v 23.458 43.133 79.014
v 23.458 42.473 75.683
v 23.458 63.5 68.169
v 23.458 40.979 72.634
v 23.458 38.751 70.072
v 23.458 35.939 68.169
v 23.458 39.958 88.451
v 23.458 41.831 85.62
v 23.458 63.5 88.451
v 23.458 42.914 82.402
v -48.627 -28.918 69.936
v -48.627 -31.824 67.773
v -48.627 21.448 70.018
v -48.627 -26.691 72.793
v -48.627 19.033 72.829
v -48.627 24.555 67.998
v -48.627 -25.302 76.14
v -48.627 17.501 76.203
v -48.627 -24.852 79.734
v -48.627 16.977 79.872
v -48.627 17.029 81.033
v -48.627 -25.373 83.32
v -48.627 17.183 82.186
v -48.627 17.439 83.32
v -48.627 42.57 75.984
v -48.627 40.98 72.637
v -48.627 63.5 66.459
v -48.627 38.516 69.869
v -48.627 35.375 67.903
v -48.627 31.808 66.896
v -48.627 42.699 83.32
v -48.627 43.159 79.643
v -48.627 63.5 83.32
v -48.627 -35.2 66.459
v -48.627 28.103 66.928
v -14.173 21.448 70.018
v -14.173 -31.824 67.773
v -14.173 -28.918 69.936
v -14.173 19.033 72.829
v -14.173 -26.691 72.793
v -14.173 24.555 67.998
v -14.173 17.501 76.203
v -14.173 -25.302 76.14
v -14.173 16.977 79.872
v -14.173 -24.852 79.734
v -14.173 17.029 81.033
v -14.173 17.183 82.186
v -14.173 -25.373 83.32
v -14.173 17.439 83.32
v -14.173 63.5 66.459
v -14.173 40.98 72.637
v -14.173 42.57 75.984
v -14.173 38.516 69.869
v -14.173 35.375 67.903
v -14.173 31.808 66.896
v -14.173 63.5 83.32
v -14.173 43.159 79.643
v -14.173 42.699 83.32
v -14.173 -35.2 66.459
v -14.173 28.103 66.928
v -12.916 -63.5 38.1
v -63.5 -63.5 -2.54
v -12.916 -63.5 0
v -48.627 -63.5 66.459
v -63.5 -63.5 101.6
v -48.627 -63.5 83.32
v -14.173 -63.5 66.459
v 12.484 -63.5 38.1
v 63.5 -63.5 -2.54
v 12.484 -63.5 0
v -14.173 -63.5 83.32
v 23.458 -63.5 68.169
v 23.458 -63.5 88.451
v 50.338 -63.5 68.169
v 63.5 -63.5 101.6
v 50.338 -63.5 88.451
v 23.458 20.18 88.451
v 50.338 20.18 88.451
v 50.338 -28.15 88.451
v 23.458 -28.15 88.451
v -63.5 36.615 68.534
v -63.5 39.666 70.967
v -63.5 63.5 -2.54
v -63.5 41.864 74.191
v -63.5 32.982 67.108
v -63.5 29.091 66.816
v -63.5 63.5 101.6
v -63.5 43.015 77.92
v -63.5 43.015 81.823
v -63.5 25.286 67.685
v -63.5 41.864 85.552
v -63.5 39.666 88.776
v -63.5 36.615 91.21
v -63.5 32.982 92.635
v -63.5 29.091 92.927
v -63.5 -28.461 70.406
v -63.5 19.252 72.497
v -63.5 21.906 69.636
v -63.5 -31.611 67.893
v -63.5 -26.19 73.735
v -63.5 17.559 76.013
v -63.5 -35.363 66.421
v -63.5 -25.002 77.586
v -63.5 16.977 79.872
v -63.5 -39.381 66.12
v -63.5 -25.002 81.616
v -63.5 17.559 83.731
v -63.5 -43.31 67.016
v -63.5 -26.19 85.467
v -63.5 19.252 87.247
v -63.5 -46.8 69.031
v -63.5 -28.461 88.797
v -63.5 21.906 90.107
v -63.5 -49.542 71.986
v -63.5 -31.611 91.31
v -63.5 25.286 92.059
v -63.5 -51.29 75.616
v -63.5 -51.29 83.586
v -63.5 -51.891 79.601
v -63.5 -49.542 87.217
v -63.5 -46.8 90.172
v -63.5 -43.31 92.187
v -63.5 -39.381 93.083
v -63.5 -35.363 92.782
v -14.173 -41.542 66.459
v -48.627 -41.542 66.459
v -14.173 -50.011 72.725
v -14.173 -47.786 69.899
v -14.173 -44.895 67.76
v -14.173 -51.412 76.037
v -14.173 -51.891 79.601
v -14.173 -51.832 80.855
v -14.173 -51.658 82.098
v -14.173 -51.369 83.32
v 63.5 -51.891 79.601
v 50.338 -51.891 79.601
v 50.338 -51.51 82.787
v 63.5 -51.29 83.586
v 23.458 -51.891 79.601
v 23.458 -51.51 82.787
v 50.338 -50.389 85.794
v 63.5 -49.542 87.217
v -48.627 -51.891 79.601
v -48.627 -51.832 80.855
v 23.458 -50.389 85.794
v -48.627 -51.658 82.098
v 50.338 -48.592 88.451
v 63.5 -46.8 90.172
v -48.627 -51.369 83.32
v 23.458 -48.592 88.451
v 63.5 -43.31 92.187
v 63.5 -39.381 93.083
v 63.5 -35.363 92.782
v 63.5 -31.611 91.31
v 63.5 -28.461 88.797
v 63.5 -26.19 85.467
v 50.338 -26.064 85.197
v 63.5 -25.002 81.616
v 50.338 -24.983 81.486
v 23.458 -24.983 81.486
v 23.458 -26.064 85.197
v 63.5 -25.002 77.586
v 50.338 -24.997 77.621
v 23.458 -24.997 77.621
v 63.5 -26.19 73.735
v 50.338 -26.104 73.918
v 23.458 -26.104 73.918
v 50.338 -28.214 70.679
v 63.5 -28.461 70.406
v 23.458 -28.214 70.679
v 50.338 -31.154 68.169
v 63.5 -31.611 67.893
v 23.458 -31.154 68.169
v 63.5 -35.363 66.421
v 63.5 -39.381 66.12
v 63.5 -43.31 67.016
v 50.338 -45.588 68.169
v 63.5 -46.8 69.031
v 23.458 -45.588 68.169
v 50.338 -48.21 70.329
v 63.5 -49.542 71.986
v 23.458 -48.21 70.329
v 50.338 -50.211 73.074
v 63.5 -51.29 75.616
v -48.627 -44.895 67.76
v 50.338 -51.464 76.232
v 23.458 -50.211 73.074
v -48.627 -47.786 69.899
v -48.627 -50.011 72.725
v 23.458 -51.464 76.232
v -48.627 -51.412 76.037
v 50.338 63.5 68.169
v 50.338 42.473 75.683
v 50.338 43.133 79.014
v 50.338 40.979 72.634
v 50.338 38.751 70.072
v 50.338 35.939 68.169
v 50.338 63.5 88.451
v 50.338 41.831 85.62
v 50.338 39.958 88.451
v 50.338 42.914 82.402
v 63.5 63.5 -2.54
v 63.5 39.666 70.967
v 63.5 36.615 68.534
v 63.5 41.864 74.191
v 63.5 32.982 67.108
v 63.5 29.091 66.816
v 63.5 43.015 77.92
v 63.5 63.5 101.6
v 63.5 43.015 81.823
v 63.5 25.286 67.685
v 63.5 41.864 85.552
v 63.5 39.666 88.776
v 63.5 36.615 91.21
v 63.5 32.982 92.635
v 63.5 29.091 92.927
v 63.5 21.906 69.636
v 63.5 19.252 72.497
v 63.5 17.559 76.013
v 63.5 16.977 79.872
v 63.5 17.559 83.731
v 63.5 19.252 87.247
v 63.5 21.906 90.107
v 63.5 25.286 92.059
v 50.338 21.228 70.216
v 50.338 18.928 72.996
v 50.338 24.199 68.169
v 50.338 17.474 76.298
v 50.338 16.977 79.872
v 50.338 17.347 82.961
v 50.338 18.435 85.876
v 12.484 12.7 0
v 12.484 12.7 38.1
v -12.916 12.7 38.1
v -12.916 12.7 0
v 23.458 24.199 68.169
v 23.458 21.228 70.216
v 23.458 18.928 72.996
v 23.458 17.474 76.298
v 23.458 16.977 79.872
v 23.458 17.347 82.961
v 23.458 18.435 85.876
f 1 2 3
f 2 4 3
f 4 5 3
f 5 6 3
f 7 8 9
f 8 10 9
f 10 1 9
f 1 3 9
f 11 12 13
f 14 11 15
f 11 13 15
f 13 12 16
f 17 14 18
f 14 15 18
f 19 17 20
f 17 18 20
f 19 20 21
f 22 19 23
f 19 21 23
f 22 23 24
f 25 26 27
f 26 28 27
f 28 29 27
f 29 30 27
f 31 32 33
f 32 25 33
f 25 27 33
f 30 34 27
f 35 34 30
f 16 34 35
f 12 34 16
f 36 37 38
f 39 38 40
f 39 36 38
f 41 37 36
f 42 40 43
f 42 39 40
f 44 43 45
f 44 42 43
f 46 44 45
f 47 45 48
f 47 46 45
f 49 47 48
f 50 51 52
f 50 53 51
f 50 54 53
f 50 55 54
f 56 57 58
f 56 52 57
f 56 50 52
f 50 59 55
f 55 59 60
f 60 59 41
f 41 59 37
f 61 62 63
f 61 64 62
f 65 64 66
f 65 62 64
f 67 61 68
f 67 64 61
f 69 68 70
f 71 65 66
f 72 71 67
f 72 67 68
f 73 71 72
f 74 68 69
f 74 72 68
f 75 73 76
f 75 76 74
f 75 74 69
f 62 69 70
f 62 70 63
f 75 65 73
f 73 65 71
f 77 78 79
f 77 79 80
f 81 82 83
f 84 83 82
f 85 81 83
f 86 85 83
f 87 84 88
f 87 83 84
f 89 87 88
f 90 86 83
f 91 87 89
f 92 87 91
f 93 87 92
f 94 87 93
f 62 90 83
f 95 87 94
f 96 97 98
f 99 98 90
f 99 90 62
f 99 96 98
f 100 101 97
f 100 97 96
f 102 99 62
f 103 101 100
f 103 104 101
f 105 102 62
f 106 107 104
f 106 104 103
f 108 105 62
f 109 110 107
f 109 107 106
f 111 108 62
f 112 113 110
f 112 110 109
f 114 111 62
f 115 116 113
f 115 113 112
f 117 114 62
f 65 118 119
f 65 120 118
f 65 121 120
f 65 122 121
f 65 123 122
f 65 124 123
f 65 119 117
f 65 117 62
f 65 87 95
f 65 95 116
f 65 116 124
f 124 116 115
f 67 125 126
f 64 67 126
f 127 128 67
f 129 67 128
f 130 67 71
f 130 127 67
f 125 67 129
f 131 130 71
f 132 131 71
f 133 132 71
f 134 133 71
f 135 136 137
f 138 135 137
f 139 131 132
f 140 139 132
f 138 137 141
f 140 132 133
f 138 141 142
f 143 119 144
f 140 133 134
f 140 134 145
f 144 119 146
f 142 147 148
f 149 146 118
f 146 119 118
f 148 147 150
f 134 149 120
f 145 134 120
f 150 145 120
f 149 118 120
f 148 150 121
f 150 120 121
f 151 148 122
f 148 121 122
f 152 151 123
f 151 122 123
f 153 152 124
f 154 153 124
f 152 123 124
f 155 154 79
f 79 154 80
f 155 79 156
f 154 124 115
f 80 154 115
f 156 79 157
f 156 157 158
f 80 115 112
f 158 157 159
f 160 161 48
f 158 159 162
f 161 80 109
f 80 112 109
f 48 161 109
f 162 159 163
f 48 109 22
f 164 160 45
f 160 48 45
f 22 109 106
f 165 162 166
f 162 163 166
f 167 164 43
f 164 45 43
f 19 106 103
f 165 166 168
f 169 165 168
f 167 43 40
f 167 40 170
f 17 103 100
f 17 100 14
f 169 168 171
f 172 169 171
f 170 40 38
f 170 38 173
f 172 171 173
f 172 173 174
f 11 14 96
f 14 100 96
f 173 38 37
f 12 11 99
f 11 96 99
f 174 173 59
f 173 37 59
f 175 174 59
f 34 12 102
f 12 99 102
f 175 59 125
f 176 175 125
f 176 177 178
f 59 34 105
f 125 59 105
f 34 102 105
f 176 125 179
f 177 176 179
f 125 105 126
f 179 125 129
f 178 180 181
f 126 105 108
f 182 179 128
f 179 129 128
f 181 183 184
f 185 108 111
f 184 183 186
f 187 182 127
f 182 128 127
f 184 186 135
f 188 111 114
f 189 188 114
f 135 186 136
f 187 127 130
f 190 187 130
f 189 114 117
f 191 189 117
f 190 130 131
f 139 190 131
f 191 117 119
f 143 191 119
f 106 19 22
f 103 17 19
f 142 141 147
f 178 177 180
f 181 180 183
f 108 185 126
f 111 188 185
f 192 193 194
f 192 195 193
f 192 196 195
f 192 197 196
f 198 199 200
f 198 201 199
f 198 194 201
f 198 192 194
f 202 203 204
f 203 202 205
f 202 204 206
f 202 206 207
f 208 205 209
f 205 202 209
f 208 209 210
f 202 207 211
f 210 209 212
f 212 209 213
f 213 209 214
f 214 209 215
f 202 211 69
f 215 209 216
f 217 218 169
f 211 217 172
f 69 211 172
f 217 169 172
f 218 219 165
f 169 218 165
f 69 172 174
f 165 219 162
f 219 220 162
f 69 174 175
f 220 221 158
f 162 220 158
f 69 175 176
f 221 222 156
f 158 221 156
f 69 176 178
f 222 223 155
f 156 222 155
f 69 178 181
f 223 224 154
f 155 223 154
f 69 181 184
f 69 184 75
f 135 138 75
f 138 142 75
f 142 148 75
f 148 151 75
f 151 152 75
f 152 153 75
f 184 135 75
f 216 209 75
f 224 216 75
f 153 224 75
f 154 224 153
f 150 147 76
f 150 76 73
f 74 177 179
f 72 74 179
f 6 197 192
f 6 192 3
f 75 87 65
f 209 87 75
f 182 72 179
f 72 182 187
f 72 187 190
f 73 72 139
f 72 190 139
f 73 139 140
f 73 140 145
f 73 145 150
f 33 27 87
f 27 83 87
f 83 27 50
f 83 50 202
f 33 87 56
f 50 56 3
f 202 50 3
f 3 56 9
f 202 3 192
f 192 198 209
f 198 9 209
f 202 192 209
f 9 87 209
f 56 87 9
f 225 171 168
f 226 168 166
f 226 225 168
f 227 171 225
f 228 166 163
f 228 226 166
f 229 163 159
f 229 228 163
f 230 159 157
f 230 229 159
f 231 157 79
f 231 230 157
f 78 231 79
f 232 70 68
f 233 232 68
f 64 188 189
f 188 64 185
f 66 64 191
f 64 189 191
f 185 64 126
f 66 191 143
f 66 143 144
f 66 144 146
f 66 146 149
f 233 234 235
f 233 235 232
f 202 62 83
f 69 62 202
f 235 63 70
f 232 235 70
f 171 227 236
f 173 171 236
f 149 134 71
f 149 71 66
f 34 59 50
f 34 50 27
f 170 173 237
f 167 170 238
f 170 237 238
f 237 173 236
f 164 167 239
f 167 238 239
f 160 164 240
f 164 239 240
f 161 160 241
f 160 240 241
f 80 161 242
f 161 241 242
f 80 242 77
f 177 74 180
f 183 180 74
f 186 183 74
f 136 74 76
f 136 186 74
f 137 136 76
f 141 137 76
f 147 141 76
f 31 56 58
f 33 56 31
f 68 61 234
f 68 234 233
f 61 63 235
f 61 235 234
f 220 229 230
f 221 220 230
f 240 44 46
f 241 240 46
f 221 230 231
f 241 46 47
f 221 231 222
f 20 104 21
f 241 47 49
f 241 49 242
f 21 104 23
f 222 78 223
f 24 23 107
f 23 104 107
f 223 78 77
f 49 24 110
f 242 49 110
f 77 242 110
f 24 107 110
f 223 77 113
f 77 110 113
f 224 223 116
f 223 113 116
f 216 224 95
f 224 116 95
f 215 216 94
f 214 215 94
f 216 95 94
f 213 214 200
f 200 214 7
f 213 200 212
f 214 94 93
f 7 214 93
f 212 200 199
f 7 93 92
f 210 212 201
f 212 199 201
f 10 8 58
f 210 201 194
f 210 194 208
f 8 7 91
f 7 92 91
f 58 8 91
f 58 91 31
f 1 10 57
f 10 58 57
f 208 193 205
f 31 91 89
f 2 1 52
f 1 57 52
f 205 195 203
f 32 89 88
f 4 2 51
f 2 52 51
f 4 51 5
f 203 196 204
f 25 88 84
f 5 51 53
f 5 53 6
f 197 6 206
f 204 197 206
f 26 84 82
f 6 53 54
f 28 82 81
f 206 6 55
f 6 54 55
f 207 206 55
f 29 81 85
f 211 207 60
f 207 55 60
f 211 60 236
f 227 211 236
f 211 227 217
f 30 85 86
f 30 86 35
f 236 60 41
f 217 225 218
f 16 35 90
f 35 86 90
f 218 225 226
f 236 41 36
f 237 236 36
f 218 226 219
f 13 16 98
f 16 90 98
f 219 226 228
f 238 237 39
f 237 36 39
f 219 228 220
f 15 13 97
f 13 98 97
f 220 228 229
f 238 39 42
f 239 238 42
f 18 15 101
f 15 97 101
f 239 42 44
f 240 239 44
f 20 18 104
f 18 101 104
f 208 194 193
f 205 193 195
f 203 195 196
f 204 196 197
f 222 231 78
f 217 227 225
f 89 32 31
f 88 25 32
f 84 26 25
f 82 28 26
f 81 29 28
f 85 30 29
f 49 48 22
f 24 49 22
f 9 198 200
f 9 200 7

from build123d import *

# Parameters (mm, degrees)
F0_W     = 127
F0_H     = 127
F1_DEPTH = 101.6
F2_W     = 25.4
F2_H     = 38.1
F3_DEPTH = 76.2
F4_W     = 127
F4_H     = 127
F5_DEPTH = 2.54
F6_W     = 34.454562
F6_H     = 16.860753
F6_W_2   = 26.879448
F6_H_2   = 20.281769
F7_DEPTH = 127.001
F8_R     = 13.091888
F8_R_2   = 13.519639
F9_DEPTH = 127.001


with BuildPart() as f1:
    # F0 (on Top) → F1 (new body)
    with BuildSketch(Plane.XY):
        Rectangle(F0_W, F0_H)
    extrude(amount=F1_DEPTH)

    # F2 (on face) → F3 (cut)
    with BuildSketch(Plane.XZ.offset(63.5)):
        with Locations((-0.216101, 19.05)):
            Rectangle(F2_W, F2_H)
    extrude(amount=-F3_DEPTH, mode=Mode.SUBTRACT)

    # F4 (on face) → F5 (join)
    with BuildSketch(Plane(origin=(0, 0, 0), x_dir=(1, 0, 0), z_dir=(0, 0, -1))):
        Rectangle(F4_W, F4_H)
    extrude(amount=F5_DEPTH)

    # F6 (on face) → F7 (cut, through all)
    with BuildSketch(Plane(origin=(0, 63.5, 0), x_dir=(-1, 0, 0), z_dir=(0, 1, 0))):
        with Locations((31.400084, 74.889273)):
            Rectangle(F6_W, F6_H)
        with Locations((-36.898153, 78.310293)):
            Rectangle(F6_W_2, F6_H_2)
    extrude(amount=-F7_DEPTH, mode=Mode.SUBTRACT)

    # F8 (on face) → F9 (cut, through all)
    with BuildSketch(Plane(origin=(-63.5, 0, 0), x_dir=(0, -1, 0), z_dir=(-1, 0, 0))):
        with Locations((-30.068897, 79.871635)):
            Circle(F8_R)
        with Locations((38.37111, 79.601437)):
            Circle(F8_R_2)
    extrude(amount=-F9_DEPTH, mode=Mode.SUBTRACT)


solid = f1.part
